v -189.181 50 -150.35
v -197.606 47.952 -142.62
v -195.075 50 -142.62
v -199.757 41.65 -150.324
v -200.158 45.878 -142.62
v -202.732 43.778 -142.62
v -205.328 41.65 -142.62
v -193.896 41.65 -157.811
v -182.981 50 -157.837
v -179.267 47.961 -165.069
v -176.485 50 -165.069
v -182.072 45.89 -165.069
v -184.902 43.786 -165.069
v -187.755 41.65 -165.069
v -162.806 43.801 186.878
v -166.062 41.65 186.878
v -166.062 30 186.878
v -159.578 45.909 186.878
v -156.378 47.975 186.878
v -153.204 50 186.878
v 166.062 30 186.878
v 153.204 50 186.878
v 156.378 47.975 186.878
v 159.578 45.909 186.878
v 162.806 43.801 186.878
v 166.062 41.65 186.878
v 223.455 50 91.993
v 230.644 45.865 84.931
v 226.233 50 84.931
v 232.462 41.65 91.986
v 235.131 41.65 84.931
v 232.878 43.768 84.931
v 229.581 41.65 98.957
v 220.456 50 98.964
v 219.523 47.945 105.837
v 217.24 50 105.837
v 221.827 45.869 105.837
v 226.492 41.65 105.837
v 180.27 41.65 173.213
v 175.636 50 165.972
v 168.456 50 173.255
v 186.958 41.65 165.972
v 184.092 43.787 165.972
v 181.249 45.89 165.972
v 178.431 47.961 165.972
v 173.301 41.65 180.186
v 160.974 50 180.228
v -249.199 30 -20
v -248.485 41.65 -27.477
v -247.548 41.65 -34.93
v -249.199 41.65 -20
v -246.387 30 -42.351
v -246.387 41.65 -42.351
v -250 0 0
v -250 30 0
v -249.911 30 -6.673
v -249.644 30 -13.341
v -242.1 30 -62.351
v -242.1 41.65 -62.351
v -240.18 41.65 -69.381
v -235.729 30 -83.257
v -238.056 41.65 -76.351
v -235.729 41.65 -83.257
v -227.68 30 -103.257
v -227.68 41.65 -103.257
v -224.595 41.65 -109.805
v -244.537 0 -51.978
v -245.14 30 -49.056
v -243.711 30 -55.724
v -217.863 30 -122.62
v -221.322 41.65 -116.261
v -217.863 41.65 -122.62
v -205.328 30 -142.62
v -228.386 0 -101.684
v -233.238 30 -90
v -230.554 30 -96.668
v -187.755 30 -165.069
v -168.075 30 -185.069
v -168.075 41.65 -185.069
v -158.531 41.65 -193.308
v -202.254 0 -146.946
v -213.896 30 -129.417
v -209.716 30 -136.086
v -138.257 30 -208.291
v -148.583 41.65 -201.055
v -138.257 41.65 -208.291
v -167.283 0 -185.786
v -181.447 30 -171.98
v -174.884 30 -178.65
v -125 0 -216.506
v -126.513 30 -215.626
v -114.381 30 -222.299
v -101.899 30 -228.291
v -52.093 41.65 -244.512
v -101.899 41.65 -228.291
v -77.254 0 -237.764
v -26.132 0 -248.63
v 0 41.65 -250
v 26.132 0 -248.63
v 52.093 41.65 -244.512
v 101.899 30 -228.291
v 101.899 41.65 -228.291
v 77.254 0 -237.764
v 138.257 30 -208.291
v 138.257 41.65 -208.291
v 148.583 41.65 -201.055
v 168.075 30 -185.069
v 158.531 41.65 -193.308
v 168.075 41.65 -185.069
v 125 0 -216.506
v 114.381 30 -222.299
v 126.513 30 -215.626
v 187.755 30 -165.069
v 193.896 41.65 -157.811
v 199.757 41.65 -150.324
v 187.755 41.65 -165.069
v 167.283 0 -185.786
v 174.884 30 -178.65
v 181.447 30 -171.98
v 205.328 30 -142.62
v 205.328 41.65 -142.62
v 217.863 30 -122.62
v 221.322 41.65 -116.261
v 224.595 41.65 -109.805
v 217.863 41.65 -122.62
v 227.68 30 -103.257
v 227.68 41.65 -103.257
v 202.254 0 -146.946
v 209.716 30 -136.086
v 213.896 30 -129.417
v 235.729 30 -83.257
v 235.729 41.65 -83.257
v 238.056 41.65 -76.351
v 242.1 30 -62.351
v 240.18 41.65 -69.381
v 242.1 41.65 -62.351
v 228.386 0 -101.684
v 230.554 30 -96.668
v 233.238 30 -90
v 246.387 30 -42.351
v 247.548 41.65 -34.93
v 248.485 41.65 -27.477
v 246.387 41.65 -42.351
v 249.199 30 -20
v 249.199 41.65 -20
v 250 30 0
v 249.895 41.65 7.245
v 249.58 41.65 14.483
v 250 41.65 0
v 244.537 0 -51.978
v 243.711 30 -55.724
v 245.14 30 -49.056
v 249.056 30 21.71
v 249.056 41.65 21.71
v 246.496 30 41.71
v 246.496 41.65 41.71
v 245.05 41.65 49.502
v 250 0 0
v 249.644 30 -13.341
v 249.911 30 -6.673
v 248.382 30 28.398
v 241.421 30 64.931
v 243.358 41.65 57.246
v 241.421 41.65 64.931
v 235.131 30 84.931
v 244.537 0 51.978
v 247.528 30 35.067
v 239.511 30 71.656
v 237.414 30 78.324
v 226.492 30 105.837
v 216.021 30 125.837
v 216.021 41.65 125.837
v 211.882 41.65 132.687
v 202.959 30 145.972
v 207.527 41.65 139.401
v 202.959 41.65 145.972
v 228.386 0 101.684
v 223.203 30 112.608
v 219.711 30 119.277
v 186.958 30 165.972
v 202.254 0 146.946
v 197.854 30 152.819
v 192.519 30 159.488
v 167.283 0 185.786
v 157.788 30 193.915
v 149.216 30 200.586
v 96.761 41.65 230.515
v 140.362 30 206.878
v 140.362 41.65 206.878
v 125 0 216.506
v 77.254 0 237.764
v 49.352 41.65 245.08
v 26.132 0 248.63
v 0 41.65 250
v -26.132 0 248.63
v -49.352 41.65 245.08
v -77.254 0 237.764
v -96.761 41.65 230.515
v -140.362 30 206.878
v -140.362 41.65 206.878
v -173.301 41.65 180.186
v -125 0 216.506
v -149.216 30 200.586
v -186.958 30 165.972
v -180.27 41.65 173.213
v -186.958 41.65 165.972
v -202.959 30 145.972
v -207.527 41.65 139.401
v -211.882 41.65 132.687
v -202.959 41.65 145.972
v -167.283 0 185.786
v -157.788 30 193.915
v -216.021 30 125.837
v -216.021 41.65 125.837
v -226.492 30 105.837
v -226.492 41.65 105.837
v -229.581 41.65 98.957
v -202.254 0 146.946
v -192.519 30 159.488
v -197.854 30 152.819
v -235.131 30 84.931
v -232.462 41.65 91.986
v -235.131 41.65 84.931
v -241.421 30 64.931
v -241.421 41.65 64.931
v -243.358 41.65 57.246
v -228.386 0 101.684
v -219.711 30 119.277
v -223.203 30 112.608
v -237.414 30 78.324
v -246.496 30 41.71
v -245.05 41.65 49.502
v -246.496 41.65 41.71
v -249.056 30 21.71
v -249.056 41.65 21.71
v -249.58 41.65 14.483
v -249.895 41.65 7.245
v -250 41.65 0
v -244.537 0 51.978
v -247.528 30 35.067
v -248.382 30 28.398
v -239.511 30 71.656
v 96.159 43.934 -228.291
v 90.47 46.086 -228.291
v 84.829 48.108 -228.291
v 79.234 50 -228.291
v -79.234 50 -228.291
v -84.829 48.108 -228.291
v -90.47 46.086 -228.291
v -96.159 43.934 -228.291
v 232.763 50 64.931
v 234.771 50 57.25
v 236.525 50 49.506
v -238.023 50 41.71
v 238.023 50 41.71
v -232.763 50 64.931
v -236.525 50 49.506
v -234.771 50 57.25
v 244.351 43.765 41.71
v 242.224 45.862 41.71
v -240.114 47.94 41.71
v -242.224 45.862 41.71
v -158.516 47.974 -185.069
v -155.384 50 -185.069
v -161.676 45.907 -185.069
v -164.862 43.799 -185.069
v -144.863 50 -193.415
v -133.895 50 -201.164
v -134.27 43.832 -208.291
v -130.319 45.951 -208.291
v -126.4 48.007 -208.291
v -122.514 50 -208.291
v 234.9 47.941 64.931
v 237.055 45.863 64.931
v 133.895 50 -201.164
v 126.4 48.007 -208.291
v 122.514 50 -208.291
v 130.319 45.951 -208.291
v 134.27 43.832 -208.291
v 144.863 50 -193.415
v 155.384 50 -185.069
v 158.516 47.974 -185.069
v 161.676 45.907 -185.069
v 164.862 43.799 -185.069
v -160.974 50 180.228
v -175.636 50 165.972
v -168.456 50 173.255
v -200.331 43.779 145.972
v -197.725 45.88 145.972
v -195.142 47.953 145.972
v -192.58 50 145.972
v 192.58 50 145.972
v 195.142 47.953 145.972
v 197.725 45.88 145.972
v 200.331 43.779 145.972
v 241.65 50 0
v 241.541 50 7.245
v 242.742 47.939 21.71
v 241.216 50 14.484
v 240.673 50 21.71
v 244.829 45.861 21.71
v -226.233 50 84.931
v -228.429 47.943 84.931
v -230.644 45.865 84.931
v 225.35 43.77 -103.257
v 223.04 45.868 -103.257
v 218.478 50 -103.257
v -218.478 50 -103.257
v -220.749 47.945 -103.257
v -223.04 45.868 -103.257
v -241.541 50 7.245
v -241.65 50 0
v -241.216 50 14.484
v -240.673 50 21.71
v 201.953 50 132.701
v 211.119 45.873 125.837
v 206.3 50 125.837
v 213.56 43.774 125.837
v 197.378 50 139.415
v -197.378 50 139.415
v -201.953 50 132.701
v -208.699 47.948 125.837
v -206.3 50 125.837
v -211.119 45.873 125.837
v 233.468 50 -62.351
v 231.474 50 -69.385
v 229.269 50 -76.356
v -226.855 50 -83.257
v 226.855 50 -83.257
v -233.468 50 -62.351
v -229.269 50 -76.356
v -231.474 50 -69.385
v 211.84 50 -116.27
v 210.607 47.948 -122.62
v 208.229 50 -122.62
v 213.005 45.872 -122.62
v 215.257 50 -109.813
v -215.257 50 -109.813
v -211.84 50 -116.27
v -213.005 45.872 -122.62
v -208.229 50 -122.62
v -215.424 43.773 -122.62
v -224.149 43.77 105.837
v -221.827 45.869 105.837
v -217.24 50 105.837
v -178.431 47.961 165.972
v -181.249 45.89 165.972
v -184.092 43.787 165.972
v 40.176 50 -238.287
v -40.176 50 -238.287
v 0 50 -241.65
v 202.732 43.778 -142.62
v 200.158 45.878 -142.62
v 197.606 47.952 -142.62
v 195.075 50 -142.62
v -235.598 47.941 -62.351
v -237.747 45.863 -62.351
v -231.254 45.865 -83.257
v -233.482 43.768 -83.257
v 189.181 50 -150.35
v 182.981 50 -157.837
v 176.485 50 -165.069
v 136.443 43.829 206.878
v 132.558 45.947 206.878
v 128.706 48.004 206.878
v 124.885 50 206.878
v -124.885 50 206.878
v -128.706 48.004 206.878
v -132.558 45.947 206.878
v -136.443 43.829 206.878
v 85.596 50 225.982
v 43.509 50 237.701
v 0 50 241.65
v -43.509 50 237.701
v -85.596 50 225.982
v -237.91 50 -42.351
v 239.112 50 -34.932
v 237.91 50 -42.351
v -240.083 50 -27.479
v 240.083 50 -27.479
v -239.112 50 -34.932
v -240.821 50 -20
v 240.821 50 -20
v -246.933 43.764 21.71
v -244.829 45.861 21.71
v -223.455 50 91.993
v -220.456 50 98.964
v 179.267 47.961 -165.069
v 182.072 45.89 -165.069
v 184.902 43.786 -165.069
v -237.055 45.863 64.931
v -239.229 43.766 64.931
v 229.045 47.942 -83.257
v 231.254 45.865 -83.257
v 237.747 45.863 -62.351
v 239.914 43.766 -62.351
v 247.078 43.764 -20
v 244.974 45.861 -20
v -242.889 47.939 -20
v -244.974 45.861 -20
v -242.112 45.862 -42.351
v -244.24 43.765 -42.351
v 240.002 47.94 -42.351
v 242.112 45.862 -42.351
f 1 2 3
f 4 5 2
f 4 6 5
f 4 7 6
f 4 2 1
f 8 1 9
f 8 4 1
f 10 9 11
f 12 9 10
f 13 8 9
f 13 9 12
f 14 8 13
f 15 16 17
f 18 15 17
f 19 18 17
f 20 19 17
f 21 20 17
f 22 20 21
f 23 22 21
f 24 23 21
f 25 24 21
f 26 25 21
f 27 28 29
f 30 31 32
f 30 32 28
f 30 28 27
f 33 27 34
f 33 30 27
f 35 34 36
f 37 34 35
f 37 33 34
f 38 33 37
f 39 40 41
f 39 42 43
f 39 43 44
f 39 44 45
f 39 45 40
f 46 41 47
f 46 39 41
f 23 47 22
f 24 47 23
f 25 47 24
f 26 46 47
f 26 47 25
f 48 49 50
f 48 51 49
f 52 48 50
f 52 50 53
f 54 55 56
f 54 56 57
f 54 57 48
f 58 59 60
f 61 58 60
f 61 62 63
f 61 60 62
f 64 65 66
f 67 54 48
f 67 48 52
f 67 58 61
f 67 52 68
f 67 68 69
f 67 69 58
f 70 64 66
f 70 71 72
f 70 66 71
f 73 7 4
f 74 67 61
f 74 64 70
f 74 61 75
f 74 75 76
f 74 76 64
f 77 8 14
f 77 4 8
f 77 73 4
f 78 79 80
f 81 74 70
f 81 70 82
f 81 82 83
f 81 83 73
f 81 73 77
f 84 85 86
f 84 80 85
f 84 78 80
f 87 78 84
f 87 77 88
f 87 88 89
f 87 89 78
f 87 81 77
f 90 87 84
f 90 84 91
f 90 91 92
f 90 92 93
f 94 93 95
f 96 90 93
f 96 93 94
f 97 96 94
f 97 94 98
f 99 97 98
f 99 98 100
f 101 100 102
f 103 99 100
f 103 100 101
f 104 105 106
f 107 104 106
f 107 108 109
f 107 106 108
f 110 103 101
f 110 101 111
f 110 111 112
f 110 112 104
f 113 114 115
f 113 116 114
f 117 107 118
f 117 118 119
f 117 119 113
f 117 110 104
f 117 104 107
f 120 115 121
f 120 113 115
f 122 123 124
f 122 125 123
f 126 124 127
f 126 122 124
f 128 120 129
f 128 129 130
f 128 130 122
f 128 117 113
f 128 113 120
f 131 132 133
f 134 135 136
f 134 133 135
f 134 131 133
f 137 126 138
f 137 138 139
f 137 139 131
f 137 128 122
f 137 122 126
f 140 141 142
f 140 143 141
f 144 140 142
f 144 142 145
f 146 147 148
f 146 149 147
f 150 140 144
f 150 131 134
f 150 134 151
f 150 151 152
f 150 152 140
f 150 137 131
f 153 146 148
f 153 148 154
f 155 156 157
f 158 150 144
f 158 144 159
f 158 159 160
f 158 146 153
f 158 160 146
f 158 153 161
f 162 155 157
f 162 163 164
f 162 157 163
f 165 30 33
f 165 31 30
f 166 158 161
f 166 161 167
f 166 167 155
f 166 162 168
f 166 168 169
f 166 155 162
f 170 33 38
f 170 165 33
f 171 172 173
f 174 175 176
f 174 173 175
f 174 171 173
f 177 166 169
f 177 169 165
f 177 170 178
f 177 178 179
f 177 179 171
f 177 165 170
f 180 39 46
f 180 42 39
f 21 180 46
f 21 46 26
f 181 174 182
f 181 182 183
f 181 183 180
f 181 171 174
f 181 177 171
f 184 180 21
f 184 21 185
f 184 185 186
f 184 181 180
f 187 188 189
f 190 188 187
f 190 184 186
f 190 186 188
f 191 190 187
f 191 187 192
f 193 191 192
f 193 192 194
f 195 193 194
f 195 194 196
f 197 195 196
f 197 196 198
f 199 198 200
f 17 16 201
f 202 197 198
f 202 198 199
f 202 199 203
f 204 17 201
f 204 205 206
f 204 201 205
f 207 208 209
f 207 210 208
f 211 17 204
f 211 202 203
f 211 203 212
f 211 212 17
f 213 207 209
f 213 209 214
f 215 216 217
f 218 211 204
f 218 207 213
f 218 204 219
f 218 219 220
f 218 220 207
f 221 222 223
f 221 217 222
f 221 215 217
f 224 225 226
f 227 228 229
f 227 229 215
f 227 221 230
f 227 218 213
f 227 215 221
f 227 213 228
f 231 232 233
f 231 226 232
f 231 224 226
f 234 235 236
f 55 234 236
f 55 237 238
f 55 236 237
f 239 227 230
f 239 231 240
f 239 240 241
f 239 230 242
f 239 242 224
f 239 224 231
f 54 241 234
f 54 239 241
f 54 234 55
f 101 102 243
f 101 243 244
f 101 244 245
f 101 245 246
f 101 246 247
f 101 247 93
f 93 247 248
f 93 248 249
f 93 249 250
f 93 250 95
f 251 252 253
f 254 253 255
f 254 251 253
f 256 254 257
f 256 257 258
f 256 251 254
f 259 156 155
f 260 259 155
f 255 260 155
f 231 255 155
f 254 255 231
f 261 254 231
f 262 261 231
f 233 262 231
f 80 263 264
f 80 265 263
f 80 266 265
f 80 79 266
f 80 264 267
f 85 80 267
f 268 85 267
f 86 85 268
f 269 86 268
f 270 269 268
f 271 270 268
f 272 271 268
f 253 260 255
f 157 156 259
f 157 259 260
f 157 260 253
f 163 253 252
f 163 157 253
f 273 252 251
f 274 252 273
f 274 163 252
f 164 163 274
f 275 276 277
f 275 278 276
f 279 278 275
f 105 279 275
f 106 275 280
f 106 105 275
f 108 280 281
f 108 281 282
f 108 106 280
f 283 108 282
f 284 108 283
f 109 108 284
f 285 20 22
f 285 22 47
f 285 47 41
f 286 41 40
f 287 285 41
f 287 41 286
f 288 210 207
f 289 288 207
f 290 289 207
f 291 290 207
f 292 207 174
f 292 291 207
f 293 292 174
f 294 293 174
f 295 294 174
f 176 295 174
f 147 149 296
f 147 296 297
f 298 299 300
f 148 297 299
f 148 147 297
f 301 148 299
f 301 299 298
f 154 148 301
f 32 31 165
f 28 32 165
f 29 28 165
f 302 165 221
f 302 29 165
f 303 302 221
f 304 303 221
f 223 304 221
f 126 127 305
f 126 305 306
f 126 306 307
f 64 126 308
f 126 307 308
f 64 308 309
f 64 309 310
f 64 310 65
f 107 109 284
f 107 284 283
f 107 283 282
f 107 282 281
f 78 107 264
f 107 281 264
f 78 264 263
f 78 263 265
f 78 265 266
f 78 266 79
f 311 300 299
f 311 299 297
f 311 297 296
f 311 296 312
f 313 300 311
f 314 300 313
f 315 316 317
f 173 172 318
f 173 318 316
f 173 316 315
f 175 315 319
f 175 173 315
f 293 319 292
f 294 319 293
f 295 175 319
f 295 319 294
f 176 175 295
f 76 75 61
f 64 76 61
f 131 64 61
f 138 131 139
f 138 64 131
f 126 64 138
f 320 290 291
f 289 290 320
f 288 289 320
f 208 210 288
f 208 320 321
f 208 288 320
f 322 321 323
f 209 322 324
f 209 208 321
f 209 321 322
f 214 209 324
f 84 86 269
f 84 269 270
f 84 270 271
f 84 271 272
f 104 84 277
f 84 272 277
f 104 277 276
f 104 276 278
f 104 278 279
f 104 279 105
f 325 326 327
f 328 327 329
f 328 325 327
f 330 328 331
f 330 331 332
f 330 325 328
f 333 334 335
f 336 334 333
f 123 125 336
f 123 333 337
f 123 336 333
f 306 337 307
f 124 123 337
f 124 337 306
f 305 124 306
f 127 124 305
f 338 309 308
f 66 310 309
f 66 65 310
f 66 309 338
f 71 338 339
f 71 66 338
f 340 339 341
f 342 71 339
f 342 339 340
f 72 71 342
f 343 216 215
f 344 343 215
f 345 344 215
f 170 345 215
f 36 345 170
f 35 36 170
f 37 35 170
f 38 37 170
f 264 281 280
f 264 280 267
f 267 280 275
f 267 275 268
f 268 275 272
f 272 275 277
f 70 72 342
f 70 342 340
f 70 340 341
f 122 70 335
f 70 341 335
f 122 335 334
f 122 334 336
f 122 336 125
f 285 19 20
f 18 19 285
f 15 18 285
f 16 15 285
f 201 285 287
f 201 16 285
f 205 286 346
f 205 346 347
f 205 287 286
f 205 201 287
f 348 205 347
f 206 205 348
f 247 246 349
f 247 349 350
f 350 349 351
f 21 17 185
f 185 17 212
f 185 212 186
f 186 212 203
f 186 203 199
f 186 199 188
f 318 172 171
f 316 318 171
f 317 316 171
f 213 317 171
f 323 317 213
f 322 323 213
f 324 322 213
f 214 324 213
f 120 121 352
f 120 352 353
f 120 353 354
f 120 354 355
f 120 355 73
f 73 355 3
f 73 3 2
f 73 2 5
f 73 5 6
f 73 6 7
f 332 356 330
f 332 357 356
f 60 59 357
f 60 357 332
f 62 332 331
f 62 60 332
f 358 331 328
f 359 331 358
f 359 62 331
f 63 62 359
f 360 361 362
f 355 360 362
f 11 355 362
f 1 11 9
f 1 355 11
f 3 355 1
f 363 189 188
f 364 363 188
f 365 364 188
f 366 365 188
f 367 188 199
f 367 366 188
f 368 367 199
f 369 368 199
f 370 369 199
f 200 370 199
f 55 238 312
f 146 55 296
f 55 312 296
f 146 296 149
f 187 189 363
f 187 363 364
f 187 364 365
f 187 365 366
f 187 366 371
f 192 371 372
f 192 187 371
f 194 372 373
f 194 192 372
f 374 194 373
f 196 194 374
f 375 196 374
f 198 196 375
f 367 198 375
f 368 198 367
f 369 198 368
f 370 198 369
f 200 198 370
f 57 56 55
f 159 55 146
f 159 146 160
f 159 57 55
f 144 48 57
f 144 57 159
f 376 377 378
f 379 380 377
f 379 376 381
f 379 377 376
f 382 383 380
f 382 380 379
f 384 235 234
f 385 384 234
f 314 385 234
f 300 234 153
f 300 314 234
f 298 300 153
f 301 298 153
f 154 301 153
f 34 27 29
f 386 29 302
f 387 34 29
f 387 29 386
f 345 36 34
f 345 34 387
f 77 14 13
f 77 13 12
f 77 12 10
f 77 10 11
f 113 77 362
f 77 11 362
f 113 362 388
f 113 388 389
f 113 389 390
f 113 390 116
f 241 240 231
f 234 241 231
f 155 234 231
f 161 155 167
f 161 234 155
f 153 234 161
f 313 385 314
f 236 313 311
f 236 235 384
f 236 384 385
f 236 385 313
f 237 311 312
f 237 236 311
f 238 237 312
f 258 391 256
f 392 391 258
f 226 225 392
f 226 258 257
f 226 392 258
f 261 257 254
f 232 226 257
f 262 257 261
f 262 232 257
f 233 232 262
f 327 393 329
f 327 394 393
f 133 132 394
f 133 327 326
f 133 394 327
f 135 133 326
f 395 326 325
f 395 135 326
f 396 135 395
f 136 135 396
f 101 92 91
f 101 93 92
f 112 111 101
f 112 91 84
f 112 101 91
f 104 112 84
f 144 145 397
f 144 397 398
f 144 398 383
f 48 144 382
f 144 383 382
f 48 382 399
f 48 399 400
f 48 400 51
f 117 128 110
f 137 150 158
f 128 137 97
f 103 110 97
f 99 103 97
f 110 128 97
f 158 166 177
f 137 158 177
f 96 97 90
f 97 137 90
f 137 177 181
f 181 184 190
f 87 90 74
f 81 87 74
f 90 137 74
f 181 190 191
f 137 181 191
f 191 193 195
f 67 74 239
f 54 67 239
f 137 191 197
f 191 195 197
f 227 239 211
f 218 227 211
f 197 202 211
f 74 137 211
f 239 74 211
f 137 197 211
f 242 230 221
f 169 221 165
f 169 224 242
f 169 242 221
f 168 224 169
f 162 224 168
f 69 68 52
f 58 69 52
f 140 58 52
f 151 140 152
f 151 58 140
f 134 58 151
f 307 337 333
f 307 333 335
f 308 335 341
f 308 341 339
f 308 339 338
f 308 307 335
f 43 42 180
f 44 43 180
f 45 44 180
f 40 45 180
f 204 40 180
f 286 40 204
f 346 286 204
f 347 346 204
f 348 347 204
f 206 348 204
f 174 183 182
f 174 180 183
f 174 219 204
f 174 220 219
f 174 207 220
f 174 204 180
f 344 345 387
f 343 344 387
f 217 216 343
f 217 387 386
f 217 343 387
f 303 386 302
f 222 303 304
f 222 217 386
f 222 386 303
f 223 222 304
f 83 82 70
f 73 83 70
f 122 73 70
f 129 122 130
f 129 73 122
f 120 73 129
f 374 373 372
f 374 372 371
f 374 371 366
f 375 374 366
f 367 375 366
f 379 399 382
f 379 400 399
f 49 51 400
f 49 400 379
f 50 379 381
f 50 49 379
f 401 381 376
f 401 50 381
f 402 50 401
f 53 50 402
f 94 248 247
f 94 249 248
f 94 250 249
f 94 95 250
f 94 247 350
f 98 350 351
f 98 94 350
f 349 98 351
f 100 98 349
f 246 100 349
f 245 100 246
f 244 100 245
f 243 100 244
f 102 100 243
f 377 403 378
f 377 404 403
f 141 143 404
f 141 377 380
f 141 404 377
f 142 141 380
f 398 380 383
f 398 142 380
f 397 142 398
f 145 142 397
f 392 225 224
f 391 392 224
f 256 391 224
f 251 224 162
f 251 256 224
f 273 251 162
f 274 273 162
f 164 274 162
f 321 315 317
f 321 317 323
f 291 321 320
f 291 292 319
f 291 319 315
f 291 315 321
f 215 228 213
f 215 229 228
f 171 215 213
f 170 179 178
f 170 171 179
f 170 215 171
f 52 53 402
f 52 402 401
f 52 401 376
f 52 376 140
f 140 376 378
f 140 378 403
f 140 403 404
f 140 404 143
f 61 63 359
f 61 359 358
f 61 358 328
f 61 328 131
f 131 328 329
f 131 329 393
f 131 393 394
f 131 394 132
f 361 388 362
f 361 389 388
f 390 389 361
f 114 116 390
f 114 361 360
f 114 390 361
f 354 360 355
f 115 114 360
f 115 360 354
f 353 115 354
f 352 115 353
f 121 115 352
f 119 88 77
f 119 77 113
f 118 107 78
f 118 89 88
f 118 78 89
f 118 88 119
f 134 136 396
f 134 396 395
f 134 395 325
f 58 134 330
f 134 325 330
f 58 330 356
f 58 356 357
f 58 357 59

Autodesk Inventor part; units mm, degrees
ref_plane "YZ Plane" through (0, 0, 0) normal (1, 0, 0) x (0, 1, 0)
ref_plane "XZ Plane" through (0, 0, 0) normal (0, 1, 0) x (-1, 0, 0)
ref_plane "XY Plane" through (0, 0, 0) normal (0, 0, 1) x (1, 0, 0)
sketch "Sketch1" plane through (0, 0, 0) normal (0, 1, 0) x (-1, 0, 0)
  circle A0 centre (0, 0) radius 250
  dimension "d0" = 500
extrude "Extrusion1" add sketch "Sketch1" along normal blind 50
chamfer "Chamfer1" distance 8.35 angle 45 1 edges at (250, 50, 0)
sketch "Sketch2" plane through (0, 50, 0) normal (0, 1, 0) x (1, 0, 0)
  circle A0 centre (0, 0) radius 250 projected
  line L0 (-269.1595, 0) -> (277.2847, 0)
  line L1 (277.2847, 0) -> (277.2847, 20)
  line L2 (277.2847, 20) -> (-269.1595, 20)
  line L3 (-269.1595, 20) -> (-269.1595, 0)
  line L4 (-257.5823, 42.3509) -> (264.9356, 42.3509)
  line L5 (264.9356, 42.3509) -> (264.9356, 62.3509)
  line L6 (264.9356, 62.3509) -> (-257.5823, 62.3509)
  line L7 (-257.5823, 62.3509) -> (-257.5823, 42.3509)
  line L8 (-250, 83.257) -> (254.1302, 83.257)
  line L9 (254.1302, 83.257) -> (254.1302, 103.257)
  line L10 (254.1302, 103.257) -> (-250, 103.257)
  line L11 (-250, 103.257) -> (-250, 83.257)
  line L12 (-232.1124, 122.6195) -> (241.7812, 122.6195)
  line L13 (241.7812, 122.6195) -> (241.7812, 142.6195)
  line L14 (241.7812, 142.6195) -> (-232.1124, 142.6195)
  line L15 (-232.1124, 142.6195) -> (-232.1124, 122.6195)
  line L16 (-202.0117, 165.0693) -> (241.7812, 165.0693)
  line L17 (241.7812, 165.0693) -> (241.7812, 185.0693)
  line L18 (241.7812, 185.0693) -> (-202.0117, 185.0693)
  line L19 (-202.0117, 185.0693) -> (-202.0117, 165.0693)
  line L20 (-151.8438, 208.2908) -> (197.016, 208.2908)
  line L21 (197.016, 208.2908) -> (197.016, 228.2908)
  line L22 (197.016, 228.2908) -> (-151.8438, 228.2908)
  line L23 (-151.8438, 228.2908) -> (-151.8438, 208.2908)
  line L24 (-257.5823, -21.7096) -> (271.882, -21.7096)
  line L25 (271.882, -21.7096) -> (271.882, -41.7096)
  line L26 (271.882, -41.7096) -> (-257.5823, -41.7096)
  line L27 (-257.5823, -41.7096) -> (-257.5823, -21.7096)
  line L28 (-250, -64.9312) -> (264.9356, -64.9312)
  line L29 (264.9356, -64.9312) -> (264.9356, -84.9312)
  line L30 (264.9356, -84.9312) -> (-250, -84.9312)
  line L31 (-250, -84.9312) -> (-250, -64.9312)
  line L32 (-236.7433, -105.8373) -> (254.1302, -105.8373)
  line L33 (254.1302, -105.8373) -> (254.1302, -125.8373)
  line L34 (254.1302, -125.8373) -> (-236.7433, -125.8373)
  line L35 (-236.7433, -125.8373) -> (-236.7433, -105.8373)
  line L36 (-215.9043, -145.9716) -> (224.8013, -145.9716)
  line L37 (224.8013, -145.9716) -> (224.8013, -165.9716)
  line L38 (224.8013, -165.9716) -> (-215.9043, -165.9716)
  line L39 (-215.9043, -165.9716) -> (-215.9043, -145.9716)
  line L40 (-185.0318, -186.8778) -> (209.3651, -186.8778)
  line L41 (209.3651, -186.8778) -> (209.3651, -206.8778)
  line L42 (209.3651, -206.8778) -> (-185.0318, -206.8778)
  line L43 (-185.0318, -206.8778) -> (-185.0318, -186.8778)
  dimension "d6" = 20
  dimension "d7" = 20
  dimension "d8" = 20
  dimension "d9" = 20
  dimension "d10" = 20
  dimension "d11" = 20
  dimension "d12" = 20
  dimension "d13" = 20
  dimension "d14" = 20
  dimension "d15" = 20
  dimension "d16" = 20
extrude "Extrusion2" cut sketch "Sketch2" against normal blind 20 contours L0 A0 L2 | A0 L2 L1 L0 | L24 L25 L26 A0 | A0 L26 L24 | L0 L3 L2 A0 | L4 A0 L6 | A0 L6 L5 L4 | A0 L26 L27 L24 | L4 L7 L6 A0 | L28 L29 L30 A0 | A0 L30 L28 | L8 A0 L10 | A0 L10 L9 L8 | A0 L30 L31 L28 | L8 L11 L10 A0 | L32 L33 L34 A0 | A0 L34 L32 | L12 A0 L14 | A0 L14 L13 L12 | A0 L34 L35 L32 | L12 L15 L14 A0 | L36 L37 L38 A0 | A0 L38 L36 | L16 A0 L18 | A0 L18 L17 L16 | A0 L38 L39 L36 | L16 L19 L18 A0 | L40 L41 L42 A0 | A0 L42 L40 | L20 A0 L22 | A0 L22 L21 L20 | A0 L42 L43 L40 | L20 L23 L22 A0
properties part number "MachiningBase"
